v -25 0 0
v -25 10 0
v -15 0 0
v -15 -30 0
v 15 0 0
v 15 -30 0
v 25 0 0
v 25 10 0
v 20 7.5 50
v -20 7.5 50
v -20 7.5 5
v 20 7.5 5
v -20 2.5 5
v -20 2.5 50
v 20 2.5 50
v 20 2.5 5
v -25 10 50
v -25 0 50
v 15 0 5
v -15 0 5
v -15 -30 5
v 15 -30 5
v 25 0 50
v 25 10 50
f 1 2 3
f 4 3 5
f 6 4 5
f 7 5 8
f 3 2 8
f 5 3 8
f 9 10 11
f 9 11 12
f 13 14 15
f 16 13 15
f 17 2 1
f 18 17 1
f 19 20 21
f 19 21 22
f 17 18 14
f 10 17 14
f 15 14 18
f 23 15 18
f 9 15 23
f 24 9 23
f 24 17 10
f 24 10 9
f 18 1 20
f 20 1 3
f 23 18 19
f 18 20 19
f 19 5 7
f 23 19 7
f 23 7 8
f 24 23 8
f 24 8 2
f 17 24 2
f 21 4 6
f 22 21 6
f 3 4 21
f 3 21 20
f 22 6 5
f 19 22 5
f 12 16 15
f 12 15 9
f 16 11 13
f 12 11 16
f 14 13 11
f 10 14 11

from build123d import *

# Parameters (mm, degrees)
F0_W     = 40
F0_H     = 5
F1_DEPTH = 50
F0_W_2   = 30
F0_H_2   = 30
F2_DEPTH = 5


with BuildPart() as f1:
    # F0 (on Top) → F1 (new body)
    with BuildSketch(Plane.XY):
        Polygon((25, 10), (-25, 10), (-25, 0), (-15, 0), (15, 0), (25, 0), align=None)
        with Locations((0, 5)):
            Rectangle(F0_W, F0_H, mode=Mode.SUBTRACT)
    extrude(amount=F1_DEPTH)

    # F0 (on Top) → F2 (join)
    with BuildSketch(Plane.XY):
        with Locations((0, -15)):
            Rectangle(F0_W_2, F0_H_2)
        with Locations((0, 5)):
            Rectangle(F0_W, F0_H)
    extrude(amount=F2_DEPTH)


solid = f1.part
